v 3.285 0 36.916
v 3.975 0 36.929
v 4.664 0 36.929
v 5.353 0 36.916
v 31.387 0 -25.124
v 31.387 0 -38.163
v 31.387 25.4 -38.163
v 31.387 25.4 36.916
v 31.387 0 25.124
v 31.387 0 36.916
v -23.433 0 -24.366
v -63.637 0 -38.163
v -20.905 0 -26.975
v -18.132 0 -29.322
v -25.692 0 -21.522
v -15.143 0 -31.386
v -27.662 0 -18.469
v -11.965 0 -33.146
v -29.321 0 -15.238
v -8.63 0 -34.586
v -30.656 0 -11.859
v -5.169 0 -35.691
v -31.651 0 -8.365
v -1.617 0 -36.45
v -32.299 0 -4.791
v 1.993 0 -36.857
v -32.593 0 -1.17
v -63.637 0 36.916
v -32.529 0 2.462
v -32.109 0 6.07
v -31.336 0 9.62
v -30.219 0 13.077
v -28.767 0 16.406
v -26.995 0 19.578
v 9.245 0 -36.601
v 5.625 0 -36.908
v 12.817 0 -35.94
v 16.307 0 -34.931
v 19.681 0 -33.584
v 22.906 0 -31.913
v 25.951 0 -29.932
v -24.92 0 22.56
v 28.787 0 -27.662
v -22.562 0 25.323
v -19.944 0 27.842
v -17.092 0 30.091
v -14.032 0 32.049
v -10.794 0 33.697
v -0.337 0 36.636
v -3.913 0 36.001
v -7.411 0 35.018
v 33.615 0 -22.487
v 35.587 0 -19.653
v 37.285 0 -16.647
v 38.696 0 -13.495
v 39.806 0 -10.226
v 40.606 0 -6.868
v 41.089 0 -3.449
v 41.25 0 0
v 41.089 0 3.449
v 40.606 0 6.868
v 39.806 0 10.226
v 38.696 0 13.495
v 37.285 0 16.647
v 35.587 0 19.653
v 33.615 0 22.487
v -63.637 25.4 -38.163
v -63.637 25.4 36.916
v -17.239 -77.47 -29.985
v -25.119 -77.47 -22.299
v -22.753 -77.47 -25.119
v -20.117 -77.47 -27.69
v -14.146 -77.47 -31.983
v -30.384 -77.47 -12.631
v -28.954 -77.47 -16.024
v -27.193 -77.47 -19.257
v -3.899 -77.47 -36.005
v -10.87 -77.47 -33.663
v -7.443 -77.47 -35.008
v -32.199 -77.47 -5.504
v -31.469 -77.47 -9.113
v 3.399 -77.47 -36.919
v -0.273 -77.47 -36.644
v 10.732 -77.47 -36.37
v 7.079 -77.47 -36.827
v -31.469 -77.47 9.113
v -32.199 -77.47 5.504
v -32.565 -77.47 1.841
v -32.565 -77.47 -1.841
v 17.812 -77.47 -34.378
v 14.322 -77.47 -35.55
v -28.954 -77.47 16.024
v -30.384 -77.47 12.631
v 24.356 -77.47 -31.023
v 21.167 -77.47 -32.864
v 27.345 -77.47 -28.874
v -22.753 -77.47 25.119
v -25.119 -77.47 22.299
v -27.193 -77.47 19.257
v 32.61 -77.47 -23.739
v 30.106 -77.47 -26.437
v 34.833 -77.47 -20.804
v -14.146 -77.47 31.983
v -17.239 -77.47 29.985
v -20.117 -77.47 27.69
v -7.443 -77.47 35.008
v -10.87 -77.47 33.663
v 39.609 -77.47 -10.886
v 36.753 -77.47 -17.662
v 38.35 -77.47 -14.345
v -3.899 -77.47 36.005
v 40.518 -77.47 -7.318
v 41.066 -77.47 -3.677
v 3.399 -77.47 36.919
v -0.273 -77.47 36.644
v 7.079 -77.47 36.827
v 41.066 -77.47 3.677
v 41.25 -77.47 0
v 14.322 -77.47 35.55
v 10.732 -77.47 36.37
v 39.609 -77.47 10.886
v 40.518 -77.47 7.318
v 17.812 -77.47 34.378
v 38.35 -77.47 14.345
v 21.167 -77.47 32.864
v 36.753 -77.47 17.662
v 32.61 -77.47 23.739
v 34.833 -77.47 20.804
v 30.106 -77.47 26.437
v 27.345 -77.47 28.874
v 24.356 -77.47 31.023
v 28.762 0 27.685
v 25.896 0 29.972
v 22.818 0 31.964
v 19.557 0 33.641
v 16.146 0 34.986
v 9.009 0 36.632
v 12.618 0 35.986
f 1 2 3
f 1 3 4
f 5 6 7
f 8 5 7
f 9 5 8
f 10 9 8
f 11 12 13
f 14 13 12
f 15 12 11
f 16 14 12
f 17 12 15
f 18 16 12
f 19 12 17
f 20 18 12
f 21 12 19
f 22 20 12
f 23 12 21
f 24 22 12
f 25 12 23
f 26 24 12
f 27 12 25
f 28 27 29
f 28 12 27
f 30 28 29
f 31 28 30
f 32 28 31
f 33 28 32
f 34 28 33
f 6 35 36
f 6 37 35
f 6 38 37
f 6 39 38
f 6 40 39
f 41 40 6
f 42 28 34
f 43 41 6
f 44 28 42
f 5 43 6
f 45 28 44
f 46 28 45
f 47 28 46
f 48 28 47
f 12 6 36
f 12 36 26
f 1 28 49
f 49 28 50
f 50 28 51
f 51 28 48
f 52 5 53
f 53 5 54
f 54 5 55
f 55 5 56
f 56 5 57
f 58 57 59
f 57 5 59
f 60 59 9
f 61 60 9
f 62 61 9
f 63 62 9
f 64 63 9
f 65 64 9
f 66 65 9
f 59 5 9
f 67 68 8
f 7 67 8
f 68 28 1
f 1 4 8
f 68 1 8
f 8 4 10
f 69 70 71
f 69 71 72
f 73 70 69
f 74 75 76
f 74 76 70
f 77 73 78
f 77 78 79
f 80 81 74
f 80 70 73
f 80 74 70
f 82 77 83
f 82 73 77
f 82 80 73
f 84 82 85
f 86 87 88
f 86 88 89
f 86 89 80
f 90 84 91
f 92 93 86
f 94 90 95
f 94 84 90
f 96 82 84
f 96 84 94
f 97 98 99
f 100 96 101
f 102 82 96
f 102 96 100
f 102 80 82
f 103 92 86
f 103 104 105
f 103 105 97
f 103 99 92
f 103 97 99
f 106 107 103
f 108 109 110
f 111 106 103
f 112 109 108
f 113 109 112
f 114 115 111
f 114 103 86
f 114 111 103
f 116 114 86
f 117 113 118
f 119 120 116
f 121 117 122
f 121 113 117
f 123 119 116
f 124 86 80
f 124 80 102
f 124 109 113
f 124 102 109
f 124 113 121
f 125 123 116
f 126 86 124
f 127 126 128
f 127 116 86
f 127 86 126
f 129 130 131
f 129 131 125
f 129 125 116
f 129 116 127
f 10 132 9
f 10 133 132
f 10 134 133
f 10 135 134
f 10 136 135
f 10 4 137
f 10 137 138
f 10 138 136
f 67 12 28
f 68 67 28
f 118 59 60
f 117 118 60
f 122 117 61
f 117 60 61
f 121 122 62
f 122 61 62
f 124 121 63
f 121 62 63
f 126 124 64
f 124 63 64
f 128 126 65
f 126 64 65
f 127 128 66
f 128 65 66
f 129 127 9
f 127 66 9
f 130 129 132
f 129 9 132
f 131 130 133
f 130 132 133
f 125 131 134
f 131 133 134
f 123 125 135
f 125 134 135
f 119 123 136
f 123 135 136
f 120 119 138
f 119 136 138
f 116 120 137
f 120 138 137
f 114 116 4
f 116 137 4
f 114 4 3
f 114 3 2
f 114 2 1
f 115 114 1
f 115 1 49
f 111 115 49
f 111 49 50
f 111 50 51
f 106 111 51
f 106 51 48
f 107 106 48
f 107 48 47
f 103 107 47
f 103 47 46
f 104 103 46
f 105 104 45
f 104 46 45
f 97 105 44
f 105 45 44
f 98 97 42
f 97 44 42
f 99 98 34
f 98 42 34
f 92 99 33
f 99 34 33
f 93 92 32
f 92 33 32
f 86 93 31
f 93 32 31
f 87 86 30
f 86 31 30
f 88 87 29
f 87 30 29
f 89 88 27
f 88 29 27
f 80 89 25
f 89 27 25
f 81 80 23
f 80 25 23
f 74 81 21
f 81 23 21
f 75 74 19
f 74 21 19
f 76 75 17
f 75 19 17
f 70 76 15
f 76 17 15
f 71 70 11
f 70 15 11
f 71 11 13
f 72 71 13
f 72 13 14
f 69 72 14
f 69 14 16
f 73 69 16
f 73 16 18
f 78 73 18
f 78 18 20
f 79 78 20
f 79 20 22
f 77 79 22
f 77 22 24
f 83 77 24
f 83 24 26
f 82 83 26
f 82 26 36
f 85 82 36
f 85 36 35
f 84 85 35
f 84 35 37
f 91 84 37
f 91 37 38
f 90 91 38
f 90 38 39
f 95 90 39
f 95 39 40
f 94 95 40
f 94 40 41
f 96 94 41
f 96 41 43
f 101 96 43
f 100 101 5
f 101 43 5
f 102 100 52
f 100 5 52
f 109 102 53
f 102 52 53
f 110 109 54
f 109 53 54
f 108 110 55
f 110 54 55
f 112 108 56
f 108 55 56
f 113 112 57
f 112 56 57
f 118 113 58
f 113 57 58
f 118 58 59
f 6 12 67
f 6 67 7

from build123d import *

# Parameters (mm, degrees)
F0_R     = 36.930663
F1_DEPTH = 77.47
F2_W     = 95.02399
F2_H     = 75.079672
F3_DEPTH = 25.4


with BuildPart() as f1:
    # F0 (on Front) → F1 (new body)
    with BuildSketch(Plane.XZ):
        with Locations((4.31927, 0)):
            Circle(F0_R)
    extrude(amount=F1_DEPTH)

    # F2 (on Front) → F3 (join)
    with BuildSketch(Plane.XZ):
        with Locations((-16.125284, -0.623651)):
            Rectangle(F2_W, F2_H)
    extrude(amount=-F3_DEPTH)


solid = f1.part
